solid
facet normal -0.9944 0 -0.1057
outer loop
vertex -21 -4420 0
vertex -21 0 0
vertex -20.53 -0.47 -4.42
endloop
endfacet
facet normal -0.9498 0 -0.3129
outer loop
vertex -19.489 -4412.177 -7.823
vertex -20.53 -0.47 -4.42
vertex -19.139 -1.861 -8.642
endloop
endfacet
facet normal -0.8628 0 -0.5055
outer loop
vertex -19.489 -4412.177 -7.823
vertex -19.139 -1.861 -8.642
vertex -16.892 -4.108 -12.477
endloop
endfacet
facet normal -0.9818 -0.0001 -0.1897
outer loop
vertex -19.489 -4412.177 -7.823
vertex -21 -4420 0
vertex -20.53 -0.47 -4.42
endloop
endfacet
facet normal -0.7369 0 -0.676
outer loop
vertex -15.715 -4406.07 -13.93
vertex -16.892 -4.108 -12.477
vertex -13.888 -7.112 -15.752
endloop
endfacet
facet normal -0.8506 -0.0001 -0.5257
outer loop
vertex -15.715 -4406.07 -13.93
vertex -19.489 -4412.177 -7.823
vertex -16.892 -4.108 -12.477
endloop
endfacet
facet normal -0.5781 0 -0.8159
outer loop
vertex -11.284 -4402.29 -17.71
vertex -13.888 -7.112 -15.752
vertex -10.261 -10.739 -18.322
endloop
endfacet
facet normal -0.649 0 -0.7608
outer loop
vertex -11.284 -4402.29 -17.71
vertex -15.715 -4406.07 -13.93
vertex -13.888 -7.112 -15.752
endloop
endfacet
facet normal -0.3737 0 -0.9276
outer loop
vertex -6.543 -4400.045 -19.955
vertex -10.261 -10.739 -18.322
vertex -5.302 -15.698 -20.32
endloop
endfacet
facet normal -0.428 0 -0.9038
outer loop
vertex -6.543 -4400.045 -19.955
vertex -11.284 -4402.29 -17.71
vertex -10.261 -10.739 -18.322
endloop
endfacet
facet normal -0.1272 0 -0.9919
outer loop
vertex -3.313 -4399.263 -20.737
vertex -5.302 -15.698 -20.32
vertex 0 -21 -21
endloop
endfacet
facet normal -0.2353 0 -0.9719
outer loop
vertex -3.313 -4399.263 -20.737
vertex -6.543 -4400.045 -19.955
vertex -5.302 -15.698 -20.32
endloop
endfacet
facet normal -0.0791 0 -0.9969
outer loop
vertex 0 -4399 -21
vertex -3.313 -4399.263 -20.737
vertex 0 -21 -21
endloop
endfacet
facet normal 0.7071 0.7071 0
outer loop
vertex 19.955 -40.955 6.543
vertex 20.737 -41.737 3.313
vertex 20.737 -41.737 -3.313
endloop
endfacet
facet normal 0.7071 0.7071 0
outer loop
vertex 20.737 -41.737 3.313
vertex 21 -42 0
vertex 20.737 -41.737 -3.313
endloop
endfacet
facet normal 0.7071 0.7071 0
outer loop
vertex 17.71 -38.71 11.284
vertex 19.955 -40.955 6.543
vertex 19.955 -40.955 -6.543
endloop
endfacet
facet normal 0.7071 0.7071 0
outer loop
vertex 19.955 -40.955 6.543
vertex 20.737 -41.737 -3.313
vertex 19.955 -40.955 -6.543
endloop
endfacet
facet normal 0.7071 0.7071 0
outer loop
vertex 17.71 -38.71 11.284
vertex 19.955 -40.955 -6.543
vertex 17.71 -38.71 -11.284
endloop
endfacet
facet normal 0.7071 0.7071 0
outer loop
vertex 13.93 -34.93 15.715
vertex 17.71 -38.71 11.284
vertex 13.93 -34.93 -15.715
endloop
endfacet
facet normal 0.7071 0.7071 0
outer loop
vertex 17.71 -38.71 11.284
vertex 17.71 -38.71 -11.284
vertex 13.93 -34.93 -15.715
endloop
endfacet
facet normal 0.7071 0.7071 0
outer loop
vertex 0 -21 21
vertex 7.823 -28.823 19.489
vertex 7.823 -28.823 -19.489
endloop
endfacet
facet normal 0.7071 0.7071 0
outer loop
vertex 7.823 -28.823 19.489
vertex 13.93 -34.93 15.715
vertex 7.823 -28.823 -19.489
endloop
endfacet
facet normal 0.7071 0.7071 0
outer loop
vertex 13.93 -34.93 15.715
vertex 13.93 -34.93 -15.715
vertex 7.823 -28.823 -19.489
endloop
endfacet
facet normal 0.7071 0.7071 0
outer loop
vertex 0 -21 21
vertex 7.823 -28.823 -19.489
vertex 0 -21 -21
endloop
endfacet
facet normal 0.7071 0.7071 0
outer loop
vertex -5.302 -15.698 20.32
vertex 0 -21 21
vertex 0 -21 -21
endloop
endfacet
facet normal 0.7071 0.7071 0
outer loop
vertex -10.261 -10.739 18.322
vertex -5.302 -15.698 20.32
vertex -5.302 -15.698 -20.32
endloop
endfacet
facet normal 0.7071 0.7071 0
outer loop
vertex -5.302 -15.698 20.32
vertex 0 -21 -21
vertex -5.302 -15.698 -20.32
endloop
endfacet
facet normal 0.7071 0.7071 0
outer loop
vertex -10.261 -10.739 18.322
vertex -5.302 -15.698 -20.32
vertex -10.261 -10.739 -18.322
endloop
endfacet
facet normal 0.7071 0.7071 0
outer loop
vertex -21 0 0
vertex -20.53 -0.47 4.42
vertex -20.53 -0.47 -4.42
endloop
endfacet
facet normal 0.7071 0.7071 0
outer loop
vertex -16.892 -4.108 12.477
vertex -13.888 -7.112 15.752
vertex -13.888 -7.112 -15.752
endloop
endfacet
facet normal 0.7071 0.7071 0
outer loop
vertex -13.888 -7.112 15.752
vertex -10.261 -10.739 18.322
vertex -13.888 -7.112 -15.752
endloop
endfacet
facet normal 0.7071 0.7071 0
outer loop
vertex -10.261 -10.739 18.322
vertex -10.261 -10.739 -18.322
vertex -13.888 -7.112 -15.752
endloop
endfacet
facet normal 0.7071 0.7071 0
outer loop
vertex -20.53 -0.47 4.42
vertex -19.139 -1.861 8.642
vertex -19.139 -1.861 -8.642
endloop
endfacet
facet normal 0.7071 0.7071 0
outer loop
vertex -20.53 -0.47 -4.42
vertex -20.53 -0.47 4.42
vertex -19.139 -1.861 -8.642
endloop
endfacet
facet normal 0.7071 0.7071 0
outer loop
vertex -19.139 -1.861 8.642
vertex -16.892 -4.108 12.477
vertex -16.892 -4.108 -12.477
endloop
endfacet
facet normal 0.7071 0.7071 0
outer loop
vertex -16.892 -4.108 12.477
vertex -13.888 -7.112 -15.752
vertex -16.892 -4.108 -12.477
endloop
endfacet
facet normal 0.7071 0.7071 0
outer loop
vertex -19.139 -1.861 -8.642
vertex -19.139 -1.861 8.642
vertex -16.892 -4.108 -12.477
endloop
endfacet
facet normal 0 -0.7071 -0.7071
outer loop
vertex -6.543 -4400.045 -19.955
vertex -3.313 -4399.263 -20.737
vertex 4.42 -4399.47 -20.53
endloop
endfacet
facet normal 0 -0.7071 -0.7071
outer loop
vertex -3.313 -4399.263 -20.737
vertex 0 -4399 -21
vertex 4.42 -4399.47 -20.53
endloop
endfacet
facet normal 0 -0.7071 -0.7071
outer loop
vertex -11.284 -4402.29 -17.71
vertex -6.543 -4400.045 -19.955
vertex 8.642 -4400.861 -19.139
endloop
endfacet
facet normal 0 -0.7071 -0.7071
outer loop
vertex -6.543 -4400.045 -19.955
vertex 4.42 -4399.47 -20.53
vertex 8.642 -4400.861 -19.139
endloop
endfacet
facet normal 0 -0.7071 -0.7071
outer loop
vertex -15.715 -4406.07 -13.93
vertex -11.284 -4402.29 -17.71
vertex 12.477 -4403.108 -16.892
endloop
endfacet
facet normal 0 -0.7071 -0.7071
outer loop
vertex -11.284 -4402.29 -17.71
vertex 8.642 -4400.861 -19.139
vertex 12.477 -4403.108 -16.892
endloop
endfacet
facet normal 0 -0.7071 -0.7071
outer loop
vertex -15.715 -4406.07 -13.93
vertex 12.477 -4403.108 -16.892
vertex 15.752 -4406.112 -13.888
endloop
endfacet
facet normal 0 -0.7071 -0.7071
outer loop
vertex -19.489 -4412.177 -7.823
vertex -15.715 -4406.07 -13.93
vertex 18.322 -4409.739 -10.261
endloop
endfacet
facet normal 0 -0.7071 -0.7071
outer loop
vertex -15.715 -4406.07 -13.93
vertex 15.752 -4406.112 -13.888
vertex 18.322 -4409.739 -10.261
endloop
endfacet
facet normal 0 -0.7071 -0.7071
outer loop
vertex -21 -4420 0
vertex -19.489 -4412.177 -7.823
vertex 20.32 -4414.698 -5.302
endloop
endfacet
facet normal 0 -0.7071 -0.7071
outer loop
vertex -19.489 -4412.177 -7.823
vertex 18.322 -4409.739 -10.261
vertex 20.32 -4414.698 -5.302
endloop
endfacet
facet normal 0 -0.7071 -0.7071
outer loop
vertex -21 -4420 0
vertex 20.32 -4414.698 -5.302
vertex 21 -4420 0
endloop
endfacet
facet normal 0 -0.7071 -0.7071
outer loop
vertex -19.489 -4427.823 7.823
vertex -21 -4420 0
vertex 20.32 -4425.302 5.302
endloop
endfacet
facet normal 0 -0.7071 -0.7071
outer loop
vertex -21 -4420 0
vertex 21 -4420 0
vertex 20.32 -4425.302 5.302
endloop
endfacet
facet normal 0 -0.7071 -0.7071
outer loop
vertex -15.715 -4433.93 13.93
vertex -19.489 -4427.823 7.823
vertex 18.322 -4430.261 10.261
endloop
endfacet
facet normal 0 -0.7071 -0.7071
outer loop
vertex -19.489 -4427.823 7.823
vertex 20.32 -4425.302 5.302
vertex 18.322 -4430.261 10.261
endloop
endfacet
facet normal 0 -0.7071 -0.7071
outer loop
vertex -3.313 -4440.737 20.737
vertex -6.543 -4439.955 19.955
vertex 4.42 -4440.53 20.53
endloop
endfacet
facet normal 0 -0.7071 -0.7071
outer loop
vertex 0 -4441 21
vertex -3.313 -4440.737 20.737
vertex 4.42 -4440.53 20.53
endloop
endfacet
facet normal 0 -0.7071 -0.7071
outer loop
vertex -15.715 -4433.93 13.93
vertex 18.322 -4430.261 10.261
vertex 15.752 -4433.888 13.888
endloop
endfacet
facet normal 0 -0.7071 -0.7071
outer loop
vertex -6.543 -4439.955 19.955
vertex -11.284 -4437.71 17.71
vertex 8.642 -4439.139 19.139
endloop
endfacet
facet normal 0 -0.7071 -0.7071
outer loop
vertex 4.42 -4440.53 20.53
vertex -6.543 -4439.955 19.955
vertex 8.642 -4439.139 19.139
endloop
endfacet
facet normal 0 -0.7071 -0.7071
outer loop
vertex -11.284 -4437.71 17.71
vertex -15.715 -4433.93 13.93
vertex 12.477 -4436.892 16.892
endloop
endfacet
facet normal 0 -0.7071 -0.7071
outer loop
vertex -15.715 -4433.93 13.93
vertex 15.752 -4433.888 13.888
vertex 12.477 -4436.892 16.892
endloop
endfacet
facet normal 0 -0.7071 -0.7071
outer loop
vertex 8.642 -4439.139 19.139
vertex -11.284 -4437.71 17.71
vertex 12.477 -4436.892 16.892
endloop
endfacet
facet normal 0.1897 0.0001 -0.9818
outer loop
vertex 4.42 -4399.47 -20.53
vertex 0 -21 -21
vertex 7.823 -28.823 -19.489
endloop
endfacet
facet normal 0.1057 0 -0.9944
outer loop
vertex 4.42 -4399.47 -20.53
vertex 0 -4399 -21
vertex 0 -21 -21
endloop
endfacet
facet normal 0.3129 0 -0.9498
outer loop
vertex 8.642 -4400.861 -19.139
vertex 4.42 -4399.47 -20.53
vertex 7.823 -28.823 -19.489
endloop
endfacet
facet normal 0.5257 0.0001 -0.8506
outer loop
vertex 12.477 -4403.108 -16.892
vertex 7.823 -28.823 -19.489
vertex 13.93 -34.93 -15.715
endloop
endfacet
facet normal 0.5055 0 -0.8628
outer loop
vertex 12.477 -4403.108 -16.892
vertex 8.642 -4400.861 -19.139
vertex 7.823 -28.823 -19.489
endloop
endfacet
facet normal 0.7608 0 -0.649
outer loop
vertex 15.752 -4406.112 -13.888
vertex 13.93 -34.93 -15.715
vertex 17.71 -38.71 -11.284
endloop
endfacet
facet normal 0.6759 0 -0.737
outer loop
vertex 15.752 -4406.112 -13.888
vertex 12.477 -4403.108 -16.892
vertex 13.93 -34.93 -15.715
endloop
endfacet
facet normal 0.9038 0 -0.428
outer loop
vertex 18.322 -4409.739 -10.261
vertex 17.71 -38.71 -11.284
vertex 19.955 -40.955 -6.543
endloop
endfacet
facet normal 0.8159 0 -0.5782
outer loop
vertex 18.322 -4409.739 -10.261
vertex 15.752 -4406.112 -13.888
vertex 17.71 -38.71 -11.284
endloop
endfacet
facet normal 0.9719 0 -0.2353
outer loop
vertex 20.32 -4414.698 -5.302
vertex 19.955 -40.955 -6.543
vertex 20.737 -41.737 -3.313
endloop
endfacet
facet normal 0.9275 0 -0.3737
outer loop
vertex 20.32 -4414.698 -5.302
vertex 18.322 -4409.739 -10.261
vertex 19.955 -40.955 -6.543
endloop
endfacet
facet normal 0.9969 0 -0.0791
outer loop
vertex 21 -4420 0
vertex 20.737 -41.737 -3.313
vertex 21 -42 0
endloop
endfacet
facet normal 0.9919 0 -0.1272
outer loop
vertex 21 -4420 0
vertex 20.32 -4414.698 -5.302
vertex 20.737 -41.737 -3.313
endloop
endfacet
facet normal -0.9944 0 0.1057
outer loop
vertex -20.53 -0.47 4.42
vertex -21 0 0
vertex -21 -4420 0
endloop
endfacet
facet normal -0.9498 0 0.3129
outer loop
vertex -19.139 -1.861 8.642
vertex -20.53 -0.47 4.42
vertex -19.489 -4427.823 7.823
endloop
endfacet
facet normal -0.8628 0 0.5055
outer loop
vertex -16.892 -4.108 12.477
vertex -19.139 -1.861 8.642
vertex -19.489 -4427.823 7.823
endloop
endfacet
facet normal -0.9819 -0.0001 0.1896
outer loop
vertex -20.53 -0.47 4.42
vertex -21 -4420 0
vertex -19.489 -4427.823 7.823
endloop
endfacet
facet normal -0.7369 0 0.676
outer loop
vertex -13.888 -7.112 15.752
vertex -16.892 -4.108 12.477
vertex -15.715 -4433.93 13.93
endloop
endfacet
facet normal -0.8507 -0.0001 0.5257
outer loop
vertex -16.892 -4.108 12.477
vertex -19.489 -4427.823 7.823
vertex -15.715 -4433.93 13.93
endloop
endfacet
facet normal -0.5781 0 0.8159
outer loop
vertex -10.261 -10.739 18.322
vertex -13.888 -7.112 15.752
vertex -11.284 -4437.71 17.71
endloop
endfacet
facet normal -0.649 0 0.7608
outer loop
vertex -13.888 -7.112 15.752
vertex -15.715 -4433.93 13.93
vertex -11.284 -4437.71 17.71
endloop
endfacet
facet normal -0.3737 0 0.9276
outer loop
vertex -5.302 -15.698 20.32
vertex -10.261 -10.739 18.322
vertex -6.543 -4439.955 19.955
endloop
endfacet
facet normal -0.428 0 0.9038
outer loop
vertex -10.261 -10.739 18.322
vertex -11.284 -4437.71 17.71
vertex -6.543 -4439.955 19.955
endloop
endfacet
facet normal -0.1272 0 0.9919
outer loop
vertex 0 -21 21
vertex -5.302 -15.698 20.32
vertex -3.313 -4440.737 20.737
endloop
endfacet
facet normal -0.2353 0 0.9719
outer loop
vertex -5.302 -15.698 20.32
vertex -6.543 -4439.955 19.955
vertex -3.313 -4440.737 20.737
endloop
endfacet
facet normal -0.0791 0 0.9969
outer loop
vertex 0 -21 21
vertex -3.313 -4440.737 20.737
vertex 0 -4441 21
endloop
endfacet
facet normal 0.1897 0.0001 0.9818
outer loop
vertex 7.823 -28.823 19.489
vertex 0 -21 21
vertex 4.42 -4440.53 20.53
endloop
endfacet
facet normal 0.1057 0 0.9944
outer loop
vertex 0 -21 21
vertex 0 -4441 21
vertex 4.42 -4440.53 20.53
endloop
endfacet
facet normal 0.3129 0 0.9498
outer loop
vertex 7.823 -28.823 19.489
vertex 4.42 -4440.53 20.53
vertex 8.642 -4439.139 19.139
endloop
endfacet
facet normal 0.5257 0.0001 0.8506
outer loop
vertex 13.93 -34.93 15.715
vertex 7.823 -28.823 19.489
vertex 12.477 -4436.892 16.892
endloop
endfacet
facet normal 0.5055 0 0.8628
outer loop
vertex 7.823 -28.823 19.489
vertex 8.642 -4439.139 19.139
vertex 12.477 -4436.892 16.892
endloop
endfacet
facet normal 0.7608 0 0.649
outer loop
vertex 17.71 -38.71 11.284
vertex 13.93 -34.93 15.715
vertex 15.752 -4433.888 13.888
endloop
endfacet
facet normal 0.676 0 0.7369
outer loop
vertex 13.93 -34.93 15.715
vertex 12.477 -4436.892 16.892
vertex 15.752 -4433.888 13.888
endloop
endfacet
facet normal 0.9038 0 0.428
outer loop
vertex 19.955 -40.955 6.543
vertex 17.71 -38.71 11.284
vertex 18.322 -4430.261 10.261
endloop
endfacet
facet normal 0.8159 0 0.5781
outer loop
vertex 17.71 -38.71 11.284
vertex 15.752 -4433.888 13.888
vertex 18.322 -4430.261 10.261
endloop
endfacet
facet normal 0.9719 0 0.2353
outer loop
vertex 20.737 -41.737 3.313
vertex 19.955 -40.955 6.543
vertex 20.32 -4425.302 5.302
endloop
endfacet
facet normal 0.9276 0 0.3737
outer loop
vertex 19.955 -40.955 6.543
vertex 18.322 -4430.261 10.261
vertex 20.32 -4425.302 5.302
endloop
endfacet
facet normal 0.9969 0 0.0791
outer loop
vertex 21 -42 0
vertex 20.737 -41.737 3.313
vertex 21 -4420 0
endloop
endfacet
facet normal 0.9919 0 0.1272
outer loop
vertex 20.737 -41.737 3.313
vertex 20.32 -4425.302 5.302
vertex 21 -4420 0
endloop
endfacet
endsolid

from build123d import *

# Parameters (mm, degrees)
F0_W     = 42
F0_H     = 42
F1_DEPTH = 4441
F3_DEPTH = 100
F5_DEPTH = 100
F6_R     = 20.99999


# Not quite as in the source:
# - a fillet or chamfer is up to 0.001 mm smaller than in the source, because OpenCascade refuses the exact size


with BuildPart() as f1:
    # F0 (on Front) → F1 (new body)
    with BuildSketch(Plane.XZ):
        Rectangle(F0_W, F0_H)
    extrude(amount=F1_DEPTH)

    # F2 (on face) → F3 (cut)
    with BuildSketch(Plane.YZ.offset(21)):
        Polygon((-4399, -21), (-4441, 21), (-4441, -21), align=None)
    extrude(amount=-F3_DEPTH, mode=Mode.SUBTRACT)

    # F4 (on face) → F5 (cut)
    with BuildSketch(Plane(origin=(0, 0, -21), x_dir=(1, 0, 0), z_dir=(0, 0, -1))):
        Polygon((21, 42), (-21, 0), (21, 0), align=None)
    extrude(amount=-F5_DEPTH, mode=Mode.SUBTRACT)

    # F6 (radius 21 in the source; OpenCascade refuses exactly that, so slightly less here)
    f6_edges = [f1.edges().sort_by_distance(p)[0] for p in [
        (-21, -2199.5, -21),
        (21, -2220.5, -21),
        (-21, -2220.5, 21),
        (21, -2241.5, 21),
    ]]
    fillet(f6_edges, radius=F6_R)


solid = f1.part
